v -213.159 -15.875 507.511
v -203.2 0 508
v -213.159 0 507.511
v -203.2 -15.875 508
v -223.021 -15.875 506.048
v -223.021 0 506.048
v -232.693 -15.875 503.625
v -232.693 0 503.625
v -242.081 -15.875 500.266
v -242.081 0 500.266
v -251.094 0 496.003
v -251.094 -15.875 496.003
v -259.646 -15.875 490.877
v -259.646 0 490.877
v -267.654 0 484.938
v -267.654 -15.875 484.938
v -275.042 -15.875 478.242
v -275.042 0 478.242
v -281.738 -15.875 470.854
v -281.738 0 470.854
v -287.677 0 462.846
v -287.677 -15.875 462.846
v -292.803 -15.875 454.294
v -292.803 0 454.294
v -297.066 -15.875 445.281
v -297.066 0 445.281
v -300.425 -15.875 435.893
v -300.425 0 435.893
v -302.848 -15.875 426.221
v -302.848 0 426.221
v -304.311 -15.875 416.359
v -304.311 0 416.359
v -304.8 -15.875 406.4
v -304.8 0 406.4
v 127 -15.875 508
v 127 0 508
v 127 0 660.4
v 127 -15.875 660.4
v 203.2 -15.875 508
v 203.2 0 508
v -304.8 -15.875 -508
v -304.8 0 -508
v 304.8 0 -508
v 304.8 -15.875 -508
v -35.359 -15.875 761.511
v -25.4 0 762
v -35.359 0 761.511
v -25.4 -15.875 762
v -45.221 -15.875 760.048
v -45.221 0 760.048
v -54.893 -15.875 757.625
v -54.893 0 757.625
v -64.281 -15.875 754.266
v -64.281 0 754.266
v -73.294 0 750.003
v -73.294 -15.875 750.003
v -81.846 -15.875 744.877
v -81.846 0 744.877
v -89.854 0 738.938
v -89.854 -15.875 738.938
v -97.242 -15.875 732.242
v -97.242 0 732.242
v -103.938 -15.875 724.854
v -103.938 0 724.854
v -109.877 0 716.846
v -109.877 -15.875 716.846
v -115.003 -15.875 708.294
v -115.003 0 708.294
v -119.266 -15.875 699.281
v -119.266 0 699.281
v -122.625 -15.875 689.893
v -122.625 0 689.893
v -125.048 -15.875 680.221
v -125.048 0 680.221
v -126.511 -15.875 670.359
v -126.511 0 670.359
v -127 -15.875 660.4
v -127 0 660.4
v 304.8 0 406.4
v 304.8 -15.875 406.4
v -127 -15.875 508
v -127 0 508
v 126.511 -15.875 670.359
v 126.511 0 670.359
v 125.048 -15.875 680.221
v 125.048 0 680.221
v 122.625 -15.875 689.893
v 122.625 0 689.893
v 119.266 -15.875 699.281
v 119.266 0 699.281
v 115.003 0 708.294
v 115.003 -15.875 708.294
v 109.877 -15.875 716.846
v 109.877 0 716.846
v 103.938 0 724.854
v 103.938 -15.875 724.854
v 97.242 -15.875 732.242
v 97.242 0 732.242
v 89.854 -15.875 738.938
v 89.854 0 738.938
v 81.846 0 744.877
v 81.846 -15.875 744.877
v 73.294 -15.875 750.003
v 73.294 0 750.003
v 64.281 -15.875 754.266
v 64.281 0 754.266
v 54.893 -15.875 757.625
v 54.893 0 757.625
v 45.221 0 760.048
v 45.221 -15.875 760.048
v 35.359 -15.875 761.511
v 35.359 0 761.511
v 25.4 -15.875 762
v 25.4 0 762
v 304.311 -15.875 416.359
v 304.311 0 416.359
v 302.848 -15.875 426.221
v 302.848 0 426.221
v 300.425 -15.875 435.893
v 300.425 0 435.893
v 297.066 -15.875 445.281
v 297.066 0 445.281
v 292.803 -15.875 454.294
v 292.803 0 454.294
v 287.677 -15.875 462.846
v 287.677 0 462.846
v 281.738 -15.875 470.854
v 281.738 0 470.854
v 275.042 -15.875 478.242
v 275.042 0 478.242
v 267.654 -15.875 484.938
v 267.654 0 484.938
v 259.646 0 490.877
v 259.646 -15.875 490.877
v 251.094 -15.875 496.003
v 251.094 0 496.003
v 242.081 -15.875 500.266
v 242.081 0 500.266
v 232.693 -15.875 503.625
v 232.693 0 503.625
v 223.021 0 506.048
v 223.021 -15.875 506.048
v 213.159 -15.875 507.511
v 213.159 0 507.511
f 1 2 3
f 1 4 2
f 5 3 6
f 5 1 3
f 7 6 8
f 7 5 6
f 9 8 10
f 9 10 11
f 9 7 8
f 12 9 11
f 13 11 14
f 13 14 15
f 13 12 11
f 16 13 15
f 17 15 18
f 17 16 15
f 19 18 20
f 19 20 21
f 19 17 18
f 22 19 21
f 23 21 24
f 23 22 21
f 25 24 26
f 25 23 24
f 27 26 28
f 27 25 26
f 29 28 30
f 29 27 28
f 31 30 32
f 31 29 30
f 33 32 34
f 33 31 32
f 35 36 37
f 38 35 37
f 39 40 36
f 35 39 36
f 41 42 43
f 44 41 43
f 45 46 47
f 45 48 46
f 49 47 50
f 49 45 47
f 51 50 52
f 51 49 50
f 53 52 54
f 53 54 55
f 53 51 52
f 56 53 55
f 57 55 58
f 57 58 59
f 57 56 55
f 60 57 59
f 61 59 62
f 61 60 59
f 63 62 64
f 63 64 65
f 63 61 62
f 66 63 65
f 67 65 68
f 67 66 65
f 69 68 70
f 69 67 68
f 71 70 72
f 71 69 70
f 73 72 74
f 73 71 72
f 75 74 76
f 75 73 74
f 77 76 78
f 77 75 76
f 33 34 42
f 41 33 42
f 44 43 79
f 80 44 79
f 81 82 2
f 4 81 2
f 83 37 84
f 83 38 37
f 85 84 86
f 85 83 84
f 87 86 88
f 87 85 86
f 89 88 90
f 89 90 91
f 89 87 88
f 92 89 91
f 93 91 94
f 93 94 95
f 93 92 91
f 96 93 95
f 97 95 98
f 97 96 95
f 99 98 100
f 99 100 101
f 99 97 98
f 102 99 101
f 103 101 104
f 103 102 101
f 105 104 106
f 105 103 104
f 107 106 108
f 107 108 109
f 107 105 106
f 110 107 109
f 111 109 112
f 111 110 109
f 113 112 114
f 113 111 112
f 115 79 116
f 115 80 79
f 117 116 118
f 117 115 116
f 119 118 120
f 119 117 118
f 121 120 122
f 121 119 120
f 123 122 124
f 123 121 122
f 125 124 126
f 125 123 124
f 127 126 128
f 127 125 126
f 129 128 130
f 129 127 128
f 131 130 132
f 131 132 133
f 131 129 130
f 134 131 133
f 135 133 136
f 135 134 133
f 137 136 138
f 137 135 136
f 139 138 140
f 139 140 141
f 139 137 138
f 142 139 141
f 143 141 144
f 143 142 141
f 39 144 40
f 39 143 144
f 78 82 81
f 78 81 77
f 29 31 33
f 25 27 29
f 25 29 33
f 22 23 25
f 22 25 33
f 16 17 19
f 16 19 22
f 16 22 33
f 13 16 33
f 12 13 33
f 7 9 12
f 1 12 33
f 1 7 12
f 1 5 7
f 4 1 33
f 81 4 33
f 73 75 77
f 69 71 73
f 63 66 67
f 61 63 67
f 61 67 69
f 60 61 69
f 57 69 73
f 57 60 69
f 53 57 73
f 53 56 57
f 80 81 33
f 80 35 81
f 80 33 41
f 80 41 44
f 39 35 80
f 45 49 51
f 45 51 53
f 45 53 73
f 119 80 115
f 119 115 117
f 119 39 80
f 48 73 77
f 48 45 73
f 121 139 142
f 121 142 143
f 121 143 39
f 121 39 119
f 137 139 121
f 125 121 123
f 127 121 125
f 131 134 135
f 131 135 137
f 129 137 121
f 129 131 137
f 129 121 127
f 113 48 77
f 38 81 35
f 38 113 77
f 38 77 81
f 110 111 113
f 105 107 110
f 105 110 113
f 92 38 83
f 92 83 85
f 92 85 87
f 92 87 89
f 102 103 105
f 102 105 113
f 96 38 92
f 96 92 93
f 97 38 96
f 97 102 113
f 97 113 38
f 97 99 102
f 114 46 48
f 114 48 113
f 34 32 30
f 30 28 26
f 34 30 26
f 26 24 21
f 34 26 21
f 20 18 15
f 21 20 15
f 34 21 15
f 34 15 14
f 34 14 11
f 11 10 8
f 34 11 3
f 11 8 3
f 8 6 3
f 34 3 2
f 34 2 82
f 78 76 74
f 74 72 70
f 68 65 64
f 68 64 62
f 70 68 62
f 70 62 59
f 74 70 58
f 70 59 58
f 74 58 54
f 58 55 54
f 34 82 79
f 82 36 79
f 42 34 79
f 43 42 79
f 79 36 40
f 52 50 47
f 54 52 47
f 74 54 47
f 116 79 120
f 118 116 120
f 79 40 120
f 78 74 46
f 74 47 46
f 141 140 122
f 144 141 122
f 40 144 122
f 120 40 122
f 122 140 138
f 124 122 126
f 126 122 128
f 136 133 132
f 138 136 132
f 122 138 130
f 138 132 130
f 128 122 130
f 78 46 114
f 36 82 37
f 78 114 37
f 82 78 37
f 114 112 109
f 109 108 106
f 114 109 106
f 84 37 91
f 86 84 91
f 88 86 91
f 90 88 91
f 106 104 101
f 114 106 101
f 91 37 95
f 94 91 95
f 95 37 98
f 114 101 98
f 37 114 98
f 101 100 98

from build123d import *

# Parameters (mm, degrees)
F0_W     = 254
F0_H     = 254
F1_DEPTH = 15.875
F2_R     = 101.6


with BuildPart() as f1:
    # F0 (on Front) → F1 (new body)
    with BuildSketch(Plane.XZ):
        Polygon((304.8, -508), (304.8, 508), (127, 508), (-127, 508), (-304.8, 508), (-304.8, -508), align=None)
        with Locations((0, 635)):
            Rectangle(F0_W, F0_H)
    extrude(amount=F1_DEPTH)

    # F2
    f2_edges = [f1.edges().sort_by_distance(p)[0] for p in [
        (127, -7.9375, 762),
        (304.8, -7.9375, 508),
        (-304.8, -7.9375, 508),
        (-127, -7.9375, 762),
    ]]
    fillet(f2_edges, radius=F2_R)


solid = f1.part
